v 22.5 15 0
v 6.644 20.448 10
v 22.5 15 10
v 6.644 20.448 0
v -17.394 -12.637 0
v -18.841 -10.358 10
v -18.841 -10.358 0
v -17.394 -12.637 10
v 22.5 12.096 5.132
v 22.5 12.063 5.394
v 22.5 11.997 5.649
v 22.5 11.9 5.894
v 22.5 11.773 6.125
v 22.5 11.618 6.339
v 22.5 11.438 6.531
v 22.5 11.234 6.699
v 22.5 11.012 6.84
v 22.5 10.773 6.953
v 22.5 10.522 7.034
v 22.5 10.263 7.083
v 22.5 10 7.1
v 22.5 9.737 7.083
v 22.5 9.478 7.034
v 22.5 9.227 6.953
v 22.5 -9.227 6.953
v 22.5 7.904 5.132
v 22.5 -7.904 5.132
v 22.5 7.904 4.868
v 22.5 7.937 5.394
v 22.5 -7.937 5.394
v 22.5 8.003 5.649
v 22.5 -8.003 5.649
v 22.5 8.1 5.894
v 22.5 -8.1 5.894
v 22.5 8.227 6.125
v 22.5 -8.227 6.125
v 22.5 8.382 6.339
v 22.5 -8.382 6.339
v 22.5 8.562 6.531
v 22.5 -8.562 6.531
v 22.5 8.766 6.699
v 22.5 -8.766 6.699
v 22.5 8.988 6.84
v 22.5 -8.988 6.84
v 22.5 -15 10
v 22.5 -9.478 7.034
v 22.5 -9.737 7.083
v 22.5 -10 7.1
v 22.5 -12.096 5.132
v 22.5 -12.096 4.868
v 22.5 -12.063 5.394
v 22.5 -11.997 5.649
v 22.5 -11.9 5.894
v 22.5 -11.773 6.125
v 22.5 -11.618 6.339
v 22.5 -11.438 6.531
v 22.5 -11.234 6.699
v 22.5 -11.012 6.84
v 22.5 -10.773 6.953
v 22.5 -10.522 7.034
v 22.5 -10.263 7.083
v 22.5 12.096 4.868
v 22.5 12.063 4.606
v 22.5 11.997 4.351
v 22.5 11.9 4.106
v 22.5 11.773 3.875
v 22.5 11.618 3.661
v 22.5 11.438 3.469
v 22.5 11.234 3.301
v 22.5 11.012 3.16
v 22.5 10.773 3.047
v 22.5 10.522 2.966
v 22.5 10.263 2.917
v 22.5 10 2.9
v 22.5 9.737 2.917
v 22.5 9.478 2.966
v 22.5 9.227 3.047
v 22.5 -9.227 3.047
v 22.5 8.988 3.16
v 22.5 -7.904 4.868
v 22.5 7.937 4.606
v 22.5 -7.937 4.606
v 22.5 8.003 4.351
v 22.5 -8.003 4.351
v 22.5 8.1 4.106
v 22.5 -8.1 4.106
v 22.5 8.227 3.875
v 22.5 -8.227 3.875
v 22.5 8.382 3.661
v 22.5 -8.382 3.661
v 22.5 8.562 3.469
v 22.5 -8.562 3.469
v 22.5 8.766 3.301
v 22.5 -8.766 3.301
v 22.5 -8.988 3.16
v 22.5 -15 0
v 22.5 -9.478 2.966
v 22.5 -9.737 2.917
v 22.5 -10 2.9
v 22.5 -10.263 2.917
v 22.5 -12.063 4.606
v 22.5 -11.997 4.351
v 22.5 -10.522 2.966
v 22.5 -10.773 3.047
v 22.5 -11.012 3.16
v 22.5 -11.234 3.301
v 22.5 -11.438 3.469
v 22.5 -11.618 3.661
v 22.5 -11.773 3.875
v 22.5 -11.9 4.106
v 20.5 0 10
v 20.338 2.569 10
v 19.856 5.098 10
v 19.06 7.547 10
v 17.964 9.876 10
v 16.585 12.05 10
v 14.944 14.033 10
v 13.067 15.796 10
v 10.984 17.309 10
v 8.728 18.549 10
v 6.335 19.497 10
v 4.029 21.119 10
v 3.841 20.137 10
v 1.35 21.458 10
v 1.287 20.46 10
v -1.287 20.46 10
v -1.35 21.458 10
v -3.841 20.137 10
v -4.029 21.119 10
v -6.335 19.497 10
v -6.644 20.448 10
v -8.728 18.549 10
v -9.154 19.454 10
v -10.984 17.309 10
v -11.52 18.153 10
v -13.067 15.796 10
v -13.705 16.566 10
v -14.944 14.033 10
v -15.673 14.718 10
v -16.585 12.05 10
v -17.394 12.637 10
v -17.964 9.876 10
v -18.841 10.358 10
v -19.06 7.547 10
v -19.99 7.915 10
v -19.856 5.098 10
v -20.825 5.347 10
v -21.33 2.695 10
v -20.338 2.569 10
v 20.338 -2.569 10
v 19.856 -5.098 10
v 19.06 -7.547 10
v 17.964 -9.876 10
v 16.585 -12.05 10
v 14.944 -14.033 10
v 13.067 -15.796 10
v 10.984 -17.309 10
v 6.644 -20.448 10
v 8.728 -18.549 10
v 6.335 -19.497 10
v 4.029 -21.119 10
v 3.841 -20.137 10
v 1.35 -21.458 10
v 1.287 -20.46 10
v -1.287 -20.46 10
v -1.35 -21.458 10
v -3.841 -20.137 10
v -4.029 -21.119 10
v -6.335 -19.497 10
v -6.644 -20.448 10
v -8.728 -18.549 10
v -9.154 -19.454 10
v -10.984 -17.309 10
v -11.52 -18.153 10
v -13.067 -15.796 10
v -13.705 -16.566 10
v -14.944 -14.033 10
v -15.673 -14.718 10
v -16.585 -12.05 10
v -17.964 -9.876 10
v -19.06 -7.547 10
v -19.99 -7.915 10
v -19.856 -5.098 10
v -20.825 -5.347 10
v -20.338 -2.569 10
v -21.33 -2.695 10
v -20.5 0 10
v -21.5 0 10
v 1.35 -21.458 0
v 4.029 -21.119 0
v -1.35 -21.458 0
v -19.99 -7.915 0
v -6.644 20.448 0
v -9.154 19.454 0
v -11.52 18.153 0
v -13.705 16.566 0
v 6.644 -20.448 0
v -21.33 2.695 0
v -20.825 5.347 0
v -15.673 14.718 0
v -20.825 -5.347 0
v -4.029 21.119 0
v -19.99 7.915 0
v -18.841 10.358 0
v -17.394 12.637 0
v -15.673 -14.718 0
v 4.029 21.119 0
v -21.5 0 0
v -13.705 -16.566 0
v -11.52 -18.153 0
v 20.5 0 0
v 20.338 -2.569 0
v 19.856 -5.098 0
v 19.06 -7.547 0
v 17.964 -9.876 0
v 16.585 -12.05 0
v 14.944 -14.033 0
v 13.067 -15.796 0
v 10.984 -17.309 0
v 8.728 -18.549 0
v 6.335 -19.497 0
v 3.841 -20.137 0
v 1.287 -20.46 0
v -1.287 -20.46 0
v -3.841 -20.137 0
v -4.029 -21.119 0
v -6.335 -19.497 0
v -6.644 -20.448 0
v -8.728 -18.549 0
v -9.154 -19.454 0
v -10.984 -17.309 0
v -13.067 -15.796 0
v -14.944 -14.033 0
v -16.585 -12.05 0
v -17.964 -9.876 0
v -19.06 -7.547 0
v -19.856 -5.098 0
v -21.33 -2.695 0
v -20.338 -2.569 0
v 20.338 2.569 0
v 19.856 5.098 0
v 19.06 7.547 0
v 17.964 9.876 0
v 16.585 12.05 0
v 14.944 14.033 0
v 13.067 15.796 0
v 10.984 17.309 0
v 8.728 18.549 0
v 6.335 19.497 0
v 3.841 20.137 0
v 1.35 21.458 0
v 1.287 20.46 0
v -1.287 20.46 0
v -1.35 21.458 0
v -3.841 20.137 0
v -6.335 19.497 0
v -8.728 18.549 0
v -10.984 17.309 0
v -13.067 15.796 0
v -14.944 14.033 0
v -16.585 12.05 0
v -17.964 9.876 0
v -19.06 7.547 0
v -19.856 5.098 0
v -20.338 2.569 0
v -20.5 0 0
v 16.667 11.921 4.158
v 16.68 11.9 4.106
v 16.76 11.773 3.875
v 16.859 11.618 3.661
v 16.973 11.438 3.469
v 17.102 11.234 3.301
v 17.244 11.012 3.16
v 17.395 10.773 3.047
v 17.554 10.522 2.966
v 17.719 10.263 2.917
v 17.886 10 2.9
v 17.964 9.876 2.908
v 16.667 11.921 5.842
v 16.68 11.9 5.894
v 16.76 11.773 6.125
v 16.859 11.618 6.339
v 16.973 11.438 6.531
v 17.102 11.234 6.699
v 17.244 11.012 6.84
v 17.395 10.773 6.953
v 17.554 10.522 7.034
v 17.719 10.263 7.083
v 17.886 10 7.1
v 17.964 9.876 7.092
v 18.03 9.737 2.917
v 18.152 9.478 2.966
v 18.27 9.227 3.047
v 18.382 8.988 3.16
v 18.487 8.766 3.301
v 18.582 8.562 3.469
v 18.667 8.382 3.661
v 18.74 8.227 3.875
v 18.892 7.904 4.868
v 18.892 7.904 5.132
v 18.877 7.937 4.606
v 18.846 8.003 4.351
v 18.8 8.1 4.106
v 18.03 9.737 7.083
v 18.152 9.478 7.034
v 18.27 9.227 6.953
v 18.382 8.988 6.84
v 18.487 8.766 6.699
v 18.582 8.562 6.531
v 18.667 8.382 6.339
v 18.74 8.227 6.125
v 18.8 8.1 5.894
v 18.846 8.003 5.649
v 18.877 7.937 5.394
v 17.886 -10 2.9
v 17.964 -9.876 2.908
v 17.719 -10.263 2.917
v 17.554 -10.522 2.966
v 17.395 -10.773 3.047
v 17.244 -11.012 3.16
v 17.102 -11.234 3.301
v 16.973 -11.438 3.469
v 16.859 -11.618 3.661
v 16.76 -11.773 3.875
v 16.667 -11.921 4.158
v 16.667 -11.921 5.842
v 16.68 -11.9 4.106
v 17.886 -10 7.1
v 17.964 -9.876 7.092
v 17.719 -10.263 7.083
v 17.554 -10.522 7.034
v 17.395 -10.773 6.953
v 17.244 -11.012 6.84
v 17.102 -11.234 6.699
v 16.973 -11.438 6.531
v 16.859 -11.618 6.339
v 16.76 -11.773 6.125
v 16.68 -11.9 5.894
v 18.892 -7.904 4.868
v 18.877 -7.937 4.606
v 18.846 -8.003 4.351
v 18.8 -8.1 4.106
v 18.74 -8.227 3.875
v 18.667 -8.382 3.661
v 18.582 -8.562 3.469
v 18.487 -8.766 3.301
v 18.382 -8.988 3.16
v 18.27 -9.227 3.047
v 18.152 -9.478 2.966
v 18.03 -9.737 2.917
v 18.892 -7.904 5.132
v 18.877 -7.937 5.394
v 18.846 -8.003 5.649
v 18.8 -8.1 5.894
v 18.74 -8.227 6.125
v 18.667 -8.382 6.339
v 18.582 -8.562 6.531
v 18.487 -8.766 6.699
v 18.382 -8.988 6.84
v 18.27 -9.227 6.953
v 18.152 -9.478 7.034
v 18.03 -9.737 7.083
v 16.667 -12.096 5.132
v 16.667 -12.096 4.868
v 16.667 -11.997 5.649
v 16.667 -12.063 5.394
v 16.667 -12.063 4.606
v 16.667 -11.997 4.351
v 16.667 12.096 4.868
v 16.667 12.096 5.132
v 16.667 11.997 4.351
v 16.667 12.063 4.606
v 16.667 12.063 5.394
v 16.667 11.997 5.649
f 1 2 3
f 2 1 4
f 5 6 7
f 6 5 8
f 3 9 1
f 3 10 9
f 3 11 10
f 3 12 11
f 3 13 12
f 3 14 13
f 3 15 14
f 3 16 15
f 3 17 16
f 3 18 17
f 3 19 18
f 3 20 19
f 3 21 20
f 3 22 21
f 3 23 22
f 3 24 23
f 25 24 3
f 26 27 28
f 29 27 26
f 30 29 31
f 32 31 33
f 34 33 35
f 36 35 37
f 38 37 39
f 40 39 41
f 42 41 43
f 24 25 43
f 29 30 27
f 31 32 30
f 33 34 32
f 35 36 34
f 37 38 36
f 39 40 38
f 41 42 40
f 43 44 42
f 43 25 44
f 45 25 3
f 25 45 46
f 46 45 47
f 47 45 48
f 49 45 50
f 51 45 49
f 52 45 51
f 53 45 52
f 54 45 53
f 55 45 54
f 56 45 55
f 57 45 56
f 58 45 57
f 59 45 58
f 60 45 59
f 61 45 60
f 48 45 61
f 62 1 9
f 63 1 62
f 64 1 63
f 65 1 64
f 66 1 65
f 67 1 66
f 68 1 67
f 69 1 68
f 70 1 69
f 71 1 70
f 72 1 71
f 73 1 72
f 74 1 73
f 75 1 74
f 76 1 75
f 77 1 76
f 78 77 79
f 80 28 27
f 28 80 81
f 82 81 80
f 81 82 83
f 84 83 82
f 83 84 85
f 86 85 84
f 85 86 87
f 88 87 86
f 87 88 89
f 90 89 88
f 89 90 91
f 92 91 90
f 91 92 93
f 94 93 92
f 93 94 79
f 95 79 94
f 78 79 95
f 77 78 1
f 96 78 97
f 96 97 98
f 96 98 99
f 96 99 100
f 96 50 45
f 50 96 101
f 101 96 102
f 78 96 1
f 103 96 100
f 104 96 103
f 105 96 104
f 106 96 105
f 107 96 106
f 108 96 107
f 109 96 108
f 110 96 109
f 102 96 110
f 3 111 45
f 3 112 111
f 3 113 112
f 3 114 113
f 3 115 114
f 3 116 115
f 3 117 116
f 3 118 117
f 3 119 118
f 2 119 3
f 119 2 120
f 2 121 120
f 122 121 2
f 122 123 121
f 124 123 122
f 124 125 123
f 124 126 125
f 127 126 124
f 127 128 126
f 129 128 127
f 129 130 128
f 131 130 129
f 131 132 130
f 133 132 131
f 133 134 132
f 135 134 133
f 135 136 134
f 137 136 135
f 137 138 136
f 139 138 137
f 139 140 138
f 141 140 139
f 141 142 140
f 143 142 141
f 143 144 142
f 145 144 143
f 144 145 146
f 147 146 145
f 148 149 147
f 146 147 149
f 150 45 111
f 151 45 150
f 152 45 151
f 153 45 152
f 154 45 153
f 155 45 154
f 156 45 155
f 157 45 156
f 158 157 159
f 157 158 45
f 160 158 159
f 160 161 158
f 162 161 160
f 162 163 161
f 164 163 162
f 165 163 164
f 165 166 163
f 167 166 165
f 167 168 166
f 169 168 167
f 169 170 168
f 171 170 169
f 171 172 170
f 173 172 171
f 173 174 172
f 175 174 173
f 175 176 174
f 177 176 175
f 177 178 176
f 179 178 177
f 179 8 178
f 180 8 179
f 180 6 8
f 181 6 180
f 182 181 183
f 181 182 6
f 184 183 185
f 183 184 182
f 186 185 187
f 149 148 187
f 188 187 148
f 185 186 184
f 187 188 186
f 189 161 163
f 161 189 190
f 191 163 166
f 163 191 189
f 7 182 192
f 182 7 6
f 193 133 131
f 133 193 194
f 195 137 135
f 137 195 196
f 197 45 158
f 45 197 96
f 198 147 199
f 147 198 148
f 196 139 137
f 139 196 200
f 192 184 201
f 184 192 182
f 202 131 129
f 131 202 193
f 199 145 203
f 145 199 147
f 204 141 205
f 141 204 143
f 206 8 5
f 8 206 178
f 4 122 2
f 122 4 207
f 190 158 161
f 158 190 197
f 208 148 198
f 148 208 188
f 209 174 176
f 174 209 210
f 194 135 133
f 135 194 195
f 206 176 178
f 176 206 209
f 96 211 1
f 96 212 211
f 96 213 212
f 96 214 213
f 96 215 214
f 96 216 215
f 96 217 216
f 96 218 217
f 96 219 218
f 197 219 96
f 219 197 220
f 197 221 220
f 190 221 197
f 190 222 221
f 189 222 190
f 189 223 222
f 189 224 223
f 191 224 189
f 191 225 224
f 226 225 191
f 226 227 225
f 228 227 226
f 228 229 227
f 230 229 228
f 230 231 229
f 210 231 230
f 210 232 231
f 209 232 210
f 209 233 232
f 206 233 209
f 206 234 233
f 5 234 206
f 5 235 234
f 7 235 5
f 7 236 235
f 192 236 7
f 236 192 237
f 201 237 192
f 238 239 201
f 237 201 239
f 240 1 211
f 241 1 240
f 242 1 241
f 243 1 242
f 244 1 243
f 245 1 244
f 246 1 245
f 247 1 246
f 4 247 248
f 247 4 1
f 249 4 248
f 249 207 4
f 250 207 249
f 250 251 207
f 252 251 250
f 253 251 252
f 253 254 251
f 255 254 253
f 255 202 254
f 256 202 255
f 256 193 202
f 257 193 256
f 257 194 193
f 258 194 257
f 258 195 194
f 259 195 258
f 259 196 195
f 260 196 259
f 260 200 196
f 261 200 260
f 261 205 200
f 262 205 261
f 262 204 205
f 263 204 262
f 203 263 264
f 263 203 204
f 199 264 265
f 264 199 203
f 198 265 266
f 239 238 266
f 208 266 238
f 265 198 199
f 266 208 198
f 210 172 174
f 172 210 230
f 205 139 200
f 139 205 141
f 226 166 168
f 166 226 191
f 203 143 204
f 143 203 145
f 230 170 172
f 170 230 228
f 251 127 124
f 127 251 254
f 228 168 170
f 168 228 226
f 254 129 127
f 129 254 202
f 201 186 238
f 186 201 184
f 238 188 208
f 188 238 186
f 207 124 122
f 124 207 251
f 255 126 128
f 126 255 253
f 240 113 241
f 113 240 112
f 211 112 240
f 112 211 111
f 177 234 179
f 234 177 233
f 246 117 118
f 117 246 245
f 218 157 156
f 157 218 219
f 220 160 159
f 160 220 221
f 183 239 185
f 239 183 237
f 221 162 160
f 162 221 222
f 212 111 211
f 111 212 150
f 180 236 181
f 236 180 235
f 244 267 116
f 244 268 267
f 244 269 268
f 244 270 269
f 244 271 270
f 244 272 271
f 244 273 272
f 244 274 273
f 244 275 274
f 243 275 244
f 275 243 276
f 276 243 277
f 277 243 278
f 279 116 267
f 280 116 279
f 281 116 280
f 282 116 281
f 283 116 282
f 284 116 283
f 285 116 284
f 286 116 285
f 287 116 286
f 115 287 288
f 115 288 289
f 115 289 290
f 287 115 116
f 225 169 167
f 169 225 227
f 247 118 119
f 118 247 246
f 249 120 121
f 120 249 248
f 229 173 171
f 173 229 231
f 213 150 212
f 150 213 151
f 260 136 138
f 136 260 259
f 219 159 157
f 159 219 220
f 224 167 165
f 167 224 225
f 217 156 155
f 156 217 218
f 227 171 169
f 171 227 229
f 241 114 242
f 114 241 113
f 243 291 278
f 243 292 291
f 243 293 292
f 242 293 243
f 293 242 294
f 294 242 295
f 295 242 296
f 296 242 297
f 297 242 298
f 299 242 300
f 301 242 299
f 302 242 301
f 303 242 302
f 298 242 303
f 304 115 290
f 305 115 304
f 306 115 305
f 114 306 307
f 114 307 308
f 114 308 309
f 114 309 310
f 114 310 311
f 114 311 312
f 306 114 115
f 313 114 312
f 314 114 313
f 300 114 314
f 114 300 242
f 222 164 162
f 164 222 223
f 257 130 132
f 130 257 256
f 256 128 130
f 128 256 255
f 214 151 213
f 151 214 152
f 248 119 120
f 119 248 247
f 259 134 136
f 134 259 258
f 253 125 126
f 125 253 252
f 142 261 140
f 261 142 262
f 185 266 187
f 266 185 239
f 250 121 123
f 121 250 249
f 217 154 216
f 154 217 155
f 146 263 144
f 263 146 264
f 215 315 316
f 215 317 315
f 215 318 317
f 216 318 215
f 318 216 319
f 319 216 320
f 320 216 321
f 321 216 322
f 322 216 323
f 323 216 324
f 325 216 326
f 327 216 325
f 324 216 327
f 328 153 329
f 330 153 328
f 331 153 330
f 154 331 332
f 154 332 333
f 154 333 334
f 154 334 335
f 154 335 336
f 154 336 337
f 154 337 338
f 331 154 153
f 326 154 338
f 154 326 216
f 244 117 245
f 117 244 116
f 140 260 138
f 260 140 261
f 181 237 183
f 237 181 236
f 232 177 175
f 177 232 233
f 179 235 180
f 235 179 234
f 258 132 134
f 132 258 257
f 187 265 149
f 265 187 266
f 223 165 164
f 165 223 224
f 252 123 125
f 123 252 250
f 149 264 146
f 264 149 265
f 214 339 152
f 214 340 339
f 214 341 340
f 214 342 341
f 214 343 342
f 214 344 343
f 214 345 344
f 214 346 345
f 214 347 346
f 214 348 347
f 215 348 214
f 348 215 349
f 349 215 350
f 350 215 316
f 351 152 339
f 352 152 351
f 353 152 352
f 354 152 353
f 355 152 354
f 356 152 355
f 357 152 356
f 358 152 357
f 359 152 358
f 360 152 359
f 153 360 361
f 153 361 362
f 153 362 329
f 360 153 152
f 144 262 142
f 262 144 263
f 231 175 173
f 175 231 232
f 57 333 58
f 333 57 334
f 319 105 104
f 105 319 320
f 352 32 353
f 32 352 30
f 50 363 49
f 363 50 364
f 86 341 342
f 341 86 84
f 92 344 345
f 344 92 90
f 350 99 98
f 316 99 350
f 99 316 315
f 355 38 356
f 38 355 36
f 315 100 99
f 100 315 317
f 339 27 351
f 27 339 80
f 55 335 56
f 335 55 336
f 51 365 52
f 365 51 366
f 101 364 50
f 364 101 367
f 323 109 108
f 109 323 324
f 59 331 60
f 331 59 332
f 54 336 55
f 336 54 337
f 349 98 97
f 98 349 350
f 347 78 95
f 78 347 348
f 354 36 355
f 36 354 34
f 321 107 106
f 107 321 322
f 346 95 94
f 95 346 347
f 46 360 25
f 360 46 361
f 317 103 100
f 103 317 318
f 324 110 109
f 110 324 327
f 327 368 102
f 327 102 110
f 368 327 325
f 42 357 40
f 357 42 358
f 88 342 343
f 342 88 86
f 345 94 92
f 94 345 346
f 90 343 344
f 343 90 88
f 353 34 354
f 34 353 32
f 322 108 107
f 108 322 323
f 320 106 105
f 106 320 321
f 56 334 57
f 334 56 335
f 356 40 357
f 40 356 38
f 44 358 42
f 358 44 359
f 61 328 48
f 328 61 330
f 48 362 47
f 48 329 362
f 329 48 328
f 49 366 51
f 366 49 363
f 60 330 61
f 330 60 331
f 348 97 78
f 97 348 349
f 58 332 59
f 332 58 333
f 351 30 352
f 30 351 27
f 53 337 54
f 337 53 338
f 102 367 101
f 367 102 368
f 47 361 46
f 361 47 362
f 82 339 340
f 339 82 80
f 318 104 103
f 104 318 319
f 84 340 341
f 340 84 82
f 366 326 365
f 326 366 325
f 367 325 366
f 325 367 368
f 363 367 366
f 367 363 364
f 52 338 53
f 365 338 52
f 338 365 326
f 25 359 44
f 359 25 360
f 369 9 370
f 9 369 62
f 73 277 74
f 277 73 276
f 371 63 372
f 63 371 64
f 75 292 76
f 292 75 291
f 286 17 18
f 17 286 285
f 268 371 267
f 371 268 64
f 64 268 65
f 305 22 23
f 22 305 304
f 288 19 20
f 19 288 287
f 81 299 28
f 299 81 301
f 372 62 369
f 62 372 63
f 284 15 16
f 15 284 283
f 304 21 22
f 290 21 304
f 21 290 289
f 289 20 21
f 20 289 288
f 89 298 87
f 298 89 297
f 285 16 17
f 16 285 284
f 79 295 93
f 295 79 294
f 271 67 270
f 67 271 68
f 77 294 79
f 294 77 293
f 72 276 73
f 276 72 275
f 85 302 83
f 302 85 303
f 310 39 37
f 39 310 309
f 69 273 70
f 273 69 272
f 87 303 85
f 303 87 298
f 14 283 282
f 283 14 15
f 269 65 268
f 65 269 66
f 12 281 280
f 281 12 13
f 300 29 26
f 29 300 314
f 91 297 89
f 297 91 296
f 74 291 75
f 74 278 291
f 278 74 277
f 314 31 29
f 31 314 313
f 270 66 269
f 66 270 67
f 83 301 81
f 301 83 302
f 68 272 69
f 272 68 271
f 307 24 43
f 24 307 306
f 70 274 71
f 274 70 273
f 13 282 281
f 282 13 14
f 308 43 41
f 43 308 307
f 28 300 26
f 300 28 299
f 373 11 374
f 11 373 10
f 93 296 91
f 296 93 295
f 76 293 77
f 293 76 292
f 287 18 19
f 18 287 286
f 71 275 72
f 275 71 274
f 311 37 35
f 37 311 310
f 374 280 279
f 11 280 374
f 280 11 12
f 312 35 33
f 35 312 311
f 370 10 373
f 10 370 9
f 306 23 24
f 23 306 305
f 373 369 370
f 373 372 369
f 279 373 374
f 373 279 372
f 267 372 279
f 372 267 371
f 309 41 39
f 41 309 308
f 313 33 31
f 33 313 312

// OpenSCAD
module housing(width, height, port)
{
    difference()
    {
        hull()
        {
            cylinder(h = height, r = width * 0.43);

            translate([-width * 0.15, -width * 0.3, 0])
            {
                cube([width * 0.6, width * 0.6, height]);
            }
       }
       
       translate([0, 0, -0.01])
       {
            cylinder(h = height + 0.02, r = width * 0.41);
       }
       
       translate([width / 3, -width / 5, height /2])
       {
            rotate([0, 90, 0])
            {   
               cylinder(h = width / 5, r = port / 2);
            }
        }

        translate([width / 3, width / 5, height /2])
        {
            rotate([0, 90, 0])
            {   
               cylinder(h = width / 5, r = port / 2);
            }
        }

   }
}

housing(50, 10, 4.2);

$fn = 50;
